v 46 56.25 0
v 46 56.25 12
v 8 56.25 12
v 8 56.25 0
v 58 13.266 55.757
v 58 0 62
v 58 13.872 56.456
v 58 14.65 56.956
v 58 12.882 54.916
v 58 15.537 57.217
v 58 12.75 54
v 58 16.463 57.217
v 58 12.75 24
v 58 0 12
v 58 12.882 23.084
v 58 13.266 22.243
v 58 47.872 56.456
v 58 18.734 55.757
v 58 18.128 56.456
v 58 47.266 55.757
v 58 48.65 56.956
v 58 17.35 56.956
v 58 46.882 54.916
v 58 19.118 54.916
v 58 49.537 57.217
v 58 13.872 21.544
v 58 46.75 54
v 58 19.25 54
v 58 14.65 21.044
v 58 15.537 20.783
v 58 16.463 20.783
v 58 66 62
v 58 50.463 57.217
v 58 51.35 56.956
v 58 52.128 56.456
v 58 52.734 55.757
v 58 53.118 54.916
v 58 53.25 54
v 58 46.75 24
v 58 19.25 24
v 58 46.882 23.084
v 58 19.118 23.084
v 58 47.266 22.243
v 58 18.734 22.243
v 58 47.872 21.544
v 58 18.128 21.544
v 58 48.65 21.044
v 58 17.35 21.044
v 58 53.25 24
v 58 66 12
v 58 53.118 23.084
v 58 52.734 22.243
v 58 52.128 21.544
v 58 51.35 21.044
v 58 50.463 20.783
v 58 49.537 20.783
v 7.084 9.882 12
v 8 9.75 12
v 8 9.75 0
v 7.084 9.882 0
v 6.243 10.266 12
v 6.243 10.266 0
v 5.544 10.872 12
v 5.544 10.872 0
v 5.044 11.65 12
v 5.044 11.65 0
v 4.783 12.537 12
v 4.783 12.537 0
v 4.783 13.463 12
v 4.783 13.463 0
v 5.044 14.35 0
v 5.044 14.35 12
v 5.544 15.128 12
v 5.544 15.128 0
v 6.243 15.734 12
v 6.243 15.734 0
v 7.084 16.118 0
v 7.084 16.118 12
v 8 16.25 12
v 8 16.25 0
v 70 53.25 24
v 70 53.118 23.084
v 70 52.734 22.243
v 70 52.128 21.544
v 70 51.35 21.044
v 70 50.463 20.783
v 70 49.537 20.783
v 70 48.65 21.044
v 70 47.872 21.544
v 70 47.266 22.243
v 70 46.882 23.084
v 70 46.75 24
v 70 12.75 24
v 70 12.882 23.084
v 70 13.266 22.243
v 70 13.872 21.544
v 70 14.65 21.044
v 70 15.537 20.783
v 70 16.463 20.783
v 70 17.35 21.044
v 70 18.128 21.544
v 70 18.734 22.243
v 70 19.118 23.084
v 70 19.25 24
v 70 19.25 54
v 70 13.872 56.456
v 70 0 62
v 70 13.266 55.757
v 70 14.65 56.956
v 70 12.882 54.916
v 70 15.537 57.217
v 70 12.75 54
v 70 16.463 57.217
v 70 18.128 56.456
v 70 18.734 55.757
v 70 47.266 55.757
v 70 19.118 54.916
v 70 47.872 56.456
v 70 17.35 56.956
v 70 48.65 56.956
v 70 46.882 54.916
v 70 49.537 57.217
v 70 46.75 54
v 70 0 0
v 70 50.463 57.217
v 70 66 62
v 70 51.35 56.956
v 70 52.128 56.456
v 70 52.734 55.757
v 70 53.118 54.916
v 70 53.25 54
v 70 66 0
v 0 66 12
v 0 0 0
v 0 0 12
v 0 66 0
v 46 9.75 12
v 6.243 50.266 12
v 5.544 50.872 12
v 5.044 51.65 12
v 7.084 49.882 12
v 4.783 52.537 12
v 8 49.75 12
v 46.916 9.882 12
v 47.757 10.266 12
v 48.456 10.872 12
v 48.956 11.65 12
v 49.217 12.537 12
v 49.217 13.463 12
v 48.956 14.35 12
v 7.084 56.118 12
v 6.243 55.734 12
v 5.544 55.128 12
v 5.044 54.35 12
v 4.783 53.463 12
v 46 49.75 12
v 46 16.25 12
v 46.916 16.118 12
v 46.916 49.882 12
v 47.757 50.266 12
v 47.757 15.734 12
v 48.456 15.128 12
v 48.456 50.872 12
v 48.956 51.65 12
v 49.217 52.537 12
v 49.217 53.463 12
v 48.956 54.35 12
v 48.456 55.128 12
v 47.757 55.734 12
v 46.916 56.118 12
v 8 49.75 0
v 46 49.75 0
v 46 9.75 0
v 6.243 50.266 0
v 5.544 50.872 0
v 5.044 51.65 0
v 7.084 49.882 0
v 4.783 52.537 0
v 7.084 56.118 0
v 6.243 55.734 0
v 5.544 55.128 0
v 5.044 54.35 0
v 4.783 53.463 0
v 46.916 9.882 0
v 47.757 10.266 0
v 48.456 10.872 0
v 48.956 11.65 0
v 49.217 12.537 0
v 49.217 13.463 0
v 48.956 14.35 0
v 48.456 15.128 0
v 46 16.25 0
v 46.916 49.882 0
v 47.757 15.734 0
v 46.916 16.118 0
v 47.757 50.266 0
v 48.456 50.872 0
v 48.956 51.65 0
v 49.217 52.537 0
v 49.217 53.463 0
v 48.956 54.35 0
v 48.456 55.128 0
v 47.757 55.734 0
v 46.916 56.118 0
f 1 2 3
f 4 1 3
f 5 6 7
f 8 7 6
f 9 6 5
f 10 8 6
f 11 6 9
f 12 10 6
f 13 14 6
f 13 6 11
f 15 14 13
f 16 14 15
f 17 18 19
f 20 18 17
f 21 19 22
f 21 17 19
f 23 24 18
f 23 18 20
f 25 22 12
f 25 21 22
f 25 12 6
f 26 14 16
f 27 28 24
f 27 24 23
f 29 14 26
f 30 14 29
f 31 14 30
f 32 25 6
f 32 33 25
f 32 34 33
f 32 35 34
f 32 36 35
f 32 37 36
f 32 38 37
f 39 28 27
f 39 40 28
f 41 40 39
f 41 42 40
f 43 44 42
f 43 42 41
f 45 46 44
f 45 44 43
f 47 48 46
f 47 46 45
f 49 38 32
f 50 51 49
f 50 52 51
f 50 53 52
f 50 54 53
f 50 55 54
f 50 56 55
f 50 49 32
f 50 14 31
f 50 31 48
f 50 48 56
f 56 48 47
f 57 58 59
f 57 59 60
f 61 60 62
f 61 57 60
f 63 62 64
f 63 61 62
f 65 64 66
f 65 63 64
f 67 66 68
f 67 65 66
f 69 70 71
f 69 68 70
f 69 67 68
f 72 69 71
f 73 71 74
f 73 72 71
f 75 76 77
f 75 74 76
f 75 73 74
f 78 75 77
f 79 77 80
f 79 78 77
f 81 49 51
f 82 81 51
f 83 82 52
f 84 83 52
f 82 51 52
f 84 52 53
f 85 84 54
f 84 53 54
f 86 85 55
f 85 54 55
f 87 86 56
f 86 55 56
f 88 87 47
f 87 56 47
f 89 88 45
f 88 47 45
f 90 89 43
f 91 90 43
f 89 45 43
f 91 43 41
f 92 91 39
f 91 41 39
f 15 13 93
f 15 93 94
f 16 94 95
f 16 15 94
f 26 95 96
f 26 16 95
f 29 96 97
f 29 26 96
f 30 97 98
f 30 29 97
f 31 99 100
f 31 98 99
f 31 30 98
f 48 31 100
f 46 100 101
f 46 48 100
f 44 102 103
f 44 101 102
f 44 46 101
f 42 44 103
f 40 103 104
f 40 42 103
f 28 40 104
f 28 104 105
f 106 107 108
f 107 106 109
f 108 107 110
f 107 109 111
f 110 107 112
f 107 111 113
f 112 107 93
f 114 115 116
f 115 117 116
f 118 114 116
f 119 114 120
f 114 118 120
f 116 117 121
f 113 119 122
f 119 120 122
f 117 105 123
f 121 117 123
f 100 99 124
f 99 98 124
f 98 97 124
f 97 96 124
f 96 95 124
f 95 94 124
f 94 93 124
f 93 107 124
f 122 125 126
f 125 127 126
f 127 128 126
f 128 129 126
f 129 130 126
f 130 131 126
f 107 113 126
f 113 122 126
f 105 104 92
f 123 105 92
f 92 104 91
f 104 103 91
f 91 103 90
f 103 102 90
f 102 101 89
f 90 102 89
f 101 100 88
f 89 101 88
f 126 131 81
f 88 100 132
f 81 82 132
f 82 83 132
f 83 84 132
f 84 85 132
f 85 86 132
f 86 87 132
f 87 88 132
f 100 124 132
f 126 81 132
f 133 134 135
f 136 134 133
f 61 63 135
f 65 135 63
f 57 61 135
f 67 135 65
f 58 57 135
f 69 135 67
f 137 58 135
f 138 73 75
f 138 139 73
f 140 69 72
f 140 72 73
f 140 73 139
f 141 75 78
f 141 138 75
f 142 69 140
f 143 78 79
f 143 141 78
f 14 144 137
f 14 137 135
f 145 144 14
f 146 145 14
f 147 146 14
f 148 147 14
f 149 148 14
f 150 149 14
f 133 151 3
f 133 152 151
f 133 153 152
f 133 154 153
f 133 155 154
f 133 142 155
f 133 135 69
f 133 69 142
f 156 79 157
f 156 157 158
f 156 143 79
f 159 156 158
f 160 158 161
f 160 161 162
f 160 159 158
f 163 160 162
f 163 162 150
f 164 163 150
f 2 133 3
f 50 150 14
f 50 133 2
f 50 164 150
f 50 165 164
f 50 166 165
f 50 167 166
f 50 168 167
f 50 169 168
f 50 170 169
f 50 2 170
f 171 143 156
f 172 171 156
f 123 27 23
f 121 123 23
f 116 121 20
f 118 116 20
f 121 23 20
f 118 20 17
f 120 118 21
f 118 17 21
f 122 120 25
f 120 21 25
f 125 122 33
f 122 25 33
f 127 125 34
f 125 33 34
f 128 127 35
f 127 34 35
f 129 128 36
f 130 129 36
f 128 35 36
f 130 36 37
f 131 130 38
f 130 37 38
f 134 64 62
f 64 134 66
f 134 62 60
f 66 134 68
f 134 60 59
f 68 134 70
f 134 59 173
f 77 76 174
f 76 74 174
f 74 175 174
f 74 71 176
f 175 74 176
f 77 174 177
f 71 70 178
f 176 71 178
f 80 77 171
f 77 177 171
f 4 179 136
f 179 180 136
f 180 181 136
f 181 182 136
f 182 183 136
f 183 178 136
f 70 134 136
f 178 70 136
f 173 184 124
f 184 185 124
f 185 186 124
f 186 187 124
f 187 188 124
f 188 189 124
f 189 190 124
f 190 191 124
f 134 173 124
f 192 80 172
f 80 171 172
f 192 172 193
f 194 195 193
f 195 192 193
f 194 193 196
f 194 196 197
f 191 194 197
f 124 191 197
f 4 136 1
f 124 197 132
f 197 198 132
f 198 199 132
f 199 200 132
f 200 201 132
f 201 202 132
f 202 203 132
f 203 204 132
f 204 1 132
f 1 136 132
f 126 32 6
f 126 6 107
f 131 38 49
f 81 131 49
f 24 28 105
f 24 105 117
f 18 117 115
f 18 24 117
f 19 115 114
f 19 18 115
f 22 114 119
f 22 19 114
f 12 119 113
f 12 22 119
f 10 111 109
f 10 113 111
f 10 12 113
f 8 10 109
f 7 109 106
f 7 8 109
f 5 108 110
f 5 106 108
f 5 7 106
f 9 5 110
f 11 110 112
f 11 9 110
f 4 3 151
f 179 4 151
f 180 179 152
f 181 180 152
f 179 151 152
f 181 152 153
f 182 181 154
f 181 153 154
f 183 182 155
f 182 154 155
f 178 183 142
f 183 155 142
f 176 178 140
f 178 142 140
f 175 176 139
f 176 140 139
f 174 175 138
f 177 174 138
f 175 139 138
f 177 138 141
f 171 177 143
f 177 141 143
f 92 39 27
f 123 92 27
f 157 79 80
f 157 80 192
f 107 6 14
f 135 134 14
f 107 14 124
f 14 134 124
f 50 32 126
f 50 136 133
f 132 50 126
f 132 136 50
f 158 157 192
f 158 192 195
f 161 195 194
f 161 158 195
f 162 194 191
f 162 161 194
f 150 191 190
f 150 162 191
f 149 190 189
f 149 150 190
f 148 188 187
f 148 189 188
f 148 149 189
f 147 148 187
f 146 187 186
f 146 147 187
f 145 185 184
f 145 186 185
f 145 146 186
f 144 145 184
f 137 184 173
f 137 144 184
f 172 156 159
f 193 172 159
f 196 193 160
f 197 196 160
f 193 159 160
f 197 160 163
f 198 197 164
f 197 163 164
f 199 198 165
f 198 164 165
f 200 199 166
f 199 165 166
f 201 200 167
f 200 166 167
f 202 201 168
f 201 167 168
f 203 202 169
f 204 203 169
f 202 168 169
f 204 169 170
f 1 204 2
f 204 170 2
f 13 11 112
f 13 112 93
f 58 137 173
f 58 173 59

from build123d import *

# Parameters (mm, degrees)
SKETCH_1_W          = 70
SKETCH_1_H          = 66
EXTRUDE_1_DEPTH     = 12
SKETCH_2_W          = 12
SKETCH_2_H          = 66
EXTRUDE_2_DEPTH     = 50
CUT_EXTRUDE_1_DEPTH = 40
CUT_EXTRUDE_2_DEPTH = 40


with BuildPart() as part:
    # 草图1 → 凸台-拉伸1 (new body)
    with BuildSketch(Plane.XY):
        with Locations((35, 33)):
            Rectangle(SKETCH_1_W, SKETCH_1_H)
    extrude(amount=EXTRUDE_1_DEPTH)

    # 草图2 → 凸台-拉伸2 (add)
    with BuildSketch(Plane.XY.offset(12)):
        with Locations((64, 33)):
            Rectangle(SKETCH_2_W, SKETCH_2_H)
    extrude(amount=EXTRUDE_2_DEPTH)

    # 草图3 → 切除-拉伸1 (cut)
    with BuildSketch(Plane.ZY.offset(-58)):
        with BuildLine():
            Line((24, 19.25), (54, 19.25))
            ThreePointArc((54, 19.25), (57.25, 16), (54, 12.75))
            Line((54, 12.75), (24, 12.75))
            ThreePointArc((24, 12.75), (20.75, 16), (24, 19.25))
        make_face()
        with BuildLine():
            Line((24, 46.75), (54, 46.75))
            ThreePointArc((54, 46.75), (57.25, 50), (54, 53.25))
            Line((54, 53.25), (24, 53.25))
            ThreePointArc((24, 53.25), (20.75, 50), (24, 46.75))
        make_face()
    extrude(amount=-CUT_EXTRUDE_1_DEPTH, mode=Mode.SUBTRACT)

    # 草图6 → 切除-拉伸2 (cut)
    with BuildSketch(Plane.XY.offset(12)):
        with BuildLine():
            Line((8, 16.25), (46, 16.25))
            ThreePointArc((46, 16.25), (49.25, 13), (46, 9.75))
            Line((46, 9.75), (8, 9.75))
            ThreePointArc((8, 9.75), (4.75, 13), (8, 16.25))
        make_face()
        with BuildLine():
            Line((8, 49.75), (46, 49.75))
            ThreePointArc((46, 49.75), (49.25, 53), (46, 56.25))
            Line((46, 56.25), (8, 56.25))
            ThreePointArc((8, 56.25), (4.75, 53), (8, 49.75))
        make_face()
    extrude(amount=-CUT_EXTRUDE_2_DEPTH, mode=Mode.SUBTRACT)


solid = part.part
